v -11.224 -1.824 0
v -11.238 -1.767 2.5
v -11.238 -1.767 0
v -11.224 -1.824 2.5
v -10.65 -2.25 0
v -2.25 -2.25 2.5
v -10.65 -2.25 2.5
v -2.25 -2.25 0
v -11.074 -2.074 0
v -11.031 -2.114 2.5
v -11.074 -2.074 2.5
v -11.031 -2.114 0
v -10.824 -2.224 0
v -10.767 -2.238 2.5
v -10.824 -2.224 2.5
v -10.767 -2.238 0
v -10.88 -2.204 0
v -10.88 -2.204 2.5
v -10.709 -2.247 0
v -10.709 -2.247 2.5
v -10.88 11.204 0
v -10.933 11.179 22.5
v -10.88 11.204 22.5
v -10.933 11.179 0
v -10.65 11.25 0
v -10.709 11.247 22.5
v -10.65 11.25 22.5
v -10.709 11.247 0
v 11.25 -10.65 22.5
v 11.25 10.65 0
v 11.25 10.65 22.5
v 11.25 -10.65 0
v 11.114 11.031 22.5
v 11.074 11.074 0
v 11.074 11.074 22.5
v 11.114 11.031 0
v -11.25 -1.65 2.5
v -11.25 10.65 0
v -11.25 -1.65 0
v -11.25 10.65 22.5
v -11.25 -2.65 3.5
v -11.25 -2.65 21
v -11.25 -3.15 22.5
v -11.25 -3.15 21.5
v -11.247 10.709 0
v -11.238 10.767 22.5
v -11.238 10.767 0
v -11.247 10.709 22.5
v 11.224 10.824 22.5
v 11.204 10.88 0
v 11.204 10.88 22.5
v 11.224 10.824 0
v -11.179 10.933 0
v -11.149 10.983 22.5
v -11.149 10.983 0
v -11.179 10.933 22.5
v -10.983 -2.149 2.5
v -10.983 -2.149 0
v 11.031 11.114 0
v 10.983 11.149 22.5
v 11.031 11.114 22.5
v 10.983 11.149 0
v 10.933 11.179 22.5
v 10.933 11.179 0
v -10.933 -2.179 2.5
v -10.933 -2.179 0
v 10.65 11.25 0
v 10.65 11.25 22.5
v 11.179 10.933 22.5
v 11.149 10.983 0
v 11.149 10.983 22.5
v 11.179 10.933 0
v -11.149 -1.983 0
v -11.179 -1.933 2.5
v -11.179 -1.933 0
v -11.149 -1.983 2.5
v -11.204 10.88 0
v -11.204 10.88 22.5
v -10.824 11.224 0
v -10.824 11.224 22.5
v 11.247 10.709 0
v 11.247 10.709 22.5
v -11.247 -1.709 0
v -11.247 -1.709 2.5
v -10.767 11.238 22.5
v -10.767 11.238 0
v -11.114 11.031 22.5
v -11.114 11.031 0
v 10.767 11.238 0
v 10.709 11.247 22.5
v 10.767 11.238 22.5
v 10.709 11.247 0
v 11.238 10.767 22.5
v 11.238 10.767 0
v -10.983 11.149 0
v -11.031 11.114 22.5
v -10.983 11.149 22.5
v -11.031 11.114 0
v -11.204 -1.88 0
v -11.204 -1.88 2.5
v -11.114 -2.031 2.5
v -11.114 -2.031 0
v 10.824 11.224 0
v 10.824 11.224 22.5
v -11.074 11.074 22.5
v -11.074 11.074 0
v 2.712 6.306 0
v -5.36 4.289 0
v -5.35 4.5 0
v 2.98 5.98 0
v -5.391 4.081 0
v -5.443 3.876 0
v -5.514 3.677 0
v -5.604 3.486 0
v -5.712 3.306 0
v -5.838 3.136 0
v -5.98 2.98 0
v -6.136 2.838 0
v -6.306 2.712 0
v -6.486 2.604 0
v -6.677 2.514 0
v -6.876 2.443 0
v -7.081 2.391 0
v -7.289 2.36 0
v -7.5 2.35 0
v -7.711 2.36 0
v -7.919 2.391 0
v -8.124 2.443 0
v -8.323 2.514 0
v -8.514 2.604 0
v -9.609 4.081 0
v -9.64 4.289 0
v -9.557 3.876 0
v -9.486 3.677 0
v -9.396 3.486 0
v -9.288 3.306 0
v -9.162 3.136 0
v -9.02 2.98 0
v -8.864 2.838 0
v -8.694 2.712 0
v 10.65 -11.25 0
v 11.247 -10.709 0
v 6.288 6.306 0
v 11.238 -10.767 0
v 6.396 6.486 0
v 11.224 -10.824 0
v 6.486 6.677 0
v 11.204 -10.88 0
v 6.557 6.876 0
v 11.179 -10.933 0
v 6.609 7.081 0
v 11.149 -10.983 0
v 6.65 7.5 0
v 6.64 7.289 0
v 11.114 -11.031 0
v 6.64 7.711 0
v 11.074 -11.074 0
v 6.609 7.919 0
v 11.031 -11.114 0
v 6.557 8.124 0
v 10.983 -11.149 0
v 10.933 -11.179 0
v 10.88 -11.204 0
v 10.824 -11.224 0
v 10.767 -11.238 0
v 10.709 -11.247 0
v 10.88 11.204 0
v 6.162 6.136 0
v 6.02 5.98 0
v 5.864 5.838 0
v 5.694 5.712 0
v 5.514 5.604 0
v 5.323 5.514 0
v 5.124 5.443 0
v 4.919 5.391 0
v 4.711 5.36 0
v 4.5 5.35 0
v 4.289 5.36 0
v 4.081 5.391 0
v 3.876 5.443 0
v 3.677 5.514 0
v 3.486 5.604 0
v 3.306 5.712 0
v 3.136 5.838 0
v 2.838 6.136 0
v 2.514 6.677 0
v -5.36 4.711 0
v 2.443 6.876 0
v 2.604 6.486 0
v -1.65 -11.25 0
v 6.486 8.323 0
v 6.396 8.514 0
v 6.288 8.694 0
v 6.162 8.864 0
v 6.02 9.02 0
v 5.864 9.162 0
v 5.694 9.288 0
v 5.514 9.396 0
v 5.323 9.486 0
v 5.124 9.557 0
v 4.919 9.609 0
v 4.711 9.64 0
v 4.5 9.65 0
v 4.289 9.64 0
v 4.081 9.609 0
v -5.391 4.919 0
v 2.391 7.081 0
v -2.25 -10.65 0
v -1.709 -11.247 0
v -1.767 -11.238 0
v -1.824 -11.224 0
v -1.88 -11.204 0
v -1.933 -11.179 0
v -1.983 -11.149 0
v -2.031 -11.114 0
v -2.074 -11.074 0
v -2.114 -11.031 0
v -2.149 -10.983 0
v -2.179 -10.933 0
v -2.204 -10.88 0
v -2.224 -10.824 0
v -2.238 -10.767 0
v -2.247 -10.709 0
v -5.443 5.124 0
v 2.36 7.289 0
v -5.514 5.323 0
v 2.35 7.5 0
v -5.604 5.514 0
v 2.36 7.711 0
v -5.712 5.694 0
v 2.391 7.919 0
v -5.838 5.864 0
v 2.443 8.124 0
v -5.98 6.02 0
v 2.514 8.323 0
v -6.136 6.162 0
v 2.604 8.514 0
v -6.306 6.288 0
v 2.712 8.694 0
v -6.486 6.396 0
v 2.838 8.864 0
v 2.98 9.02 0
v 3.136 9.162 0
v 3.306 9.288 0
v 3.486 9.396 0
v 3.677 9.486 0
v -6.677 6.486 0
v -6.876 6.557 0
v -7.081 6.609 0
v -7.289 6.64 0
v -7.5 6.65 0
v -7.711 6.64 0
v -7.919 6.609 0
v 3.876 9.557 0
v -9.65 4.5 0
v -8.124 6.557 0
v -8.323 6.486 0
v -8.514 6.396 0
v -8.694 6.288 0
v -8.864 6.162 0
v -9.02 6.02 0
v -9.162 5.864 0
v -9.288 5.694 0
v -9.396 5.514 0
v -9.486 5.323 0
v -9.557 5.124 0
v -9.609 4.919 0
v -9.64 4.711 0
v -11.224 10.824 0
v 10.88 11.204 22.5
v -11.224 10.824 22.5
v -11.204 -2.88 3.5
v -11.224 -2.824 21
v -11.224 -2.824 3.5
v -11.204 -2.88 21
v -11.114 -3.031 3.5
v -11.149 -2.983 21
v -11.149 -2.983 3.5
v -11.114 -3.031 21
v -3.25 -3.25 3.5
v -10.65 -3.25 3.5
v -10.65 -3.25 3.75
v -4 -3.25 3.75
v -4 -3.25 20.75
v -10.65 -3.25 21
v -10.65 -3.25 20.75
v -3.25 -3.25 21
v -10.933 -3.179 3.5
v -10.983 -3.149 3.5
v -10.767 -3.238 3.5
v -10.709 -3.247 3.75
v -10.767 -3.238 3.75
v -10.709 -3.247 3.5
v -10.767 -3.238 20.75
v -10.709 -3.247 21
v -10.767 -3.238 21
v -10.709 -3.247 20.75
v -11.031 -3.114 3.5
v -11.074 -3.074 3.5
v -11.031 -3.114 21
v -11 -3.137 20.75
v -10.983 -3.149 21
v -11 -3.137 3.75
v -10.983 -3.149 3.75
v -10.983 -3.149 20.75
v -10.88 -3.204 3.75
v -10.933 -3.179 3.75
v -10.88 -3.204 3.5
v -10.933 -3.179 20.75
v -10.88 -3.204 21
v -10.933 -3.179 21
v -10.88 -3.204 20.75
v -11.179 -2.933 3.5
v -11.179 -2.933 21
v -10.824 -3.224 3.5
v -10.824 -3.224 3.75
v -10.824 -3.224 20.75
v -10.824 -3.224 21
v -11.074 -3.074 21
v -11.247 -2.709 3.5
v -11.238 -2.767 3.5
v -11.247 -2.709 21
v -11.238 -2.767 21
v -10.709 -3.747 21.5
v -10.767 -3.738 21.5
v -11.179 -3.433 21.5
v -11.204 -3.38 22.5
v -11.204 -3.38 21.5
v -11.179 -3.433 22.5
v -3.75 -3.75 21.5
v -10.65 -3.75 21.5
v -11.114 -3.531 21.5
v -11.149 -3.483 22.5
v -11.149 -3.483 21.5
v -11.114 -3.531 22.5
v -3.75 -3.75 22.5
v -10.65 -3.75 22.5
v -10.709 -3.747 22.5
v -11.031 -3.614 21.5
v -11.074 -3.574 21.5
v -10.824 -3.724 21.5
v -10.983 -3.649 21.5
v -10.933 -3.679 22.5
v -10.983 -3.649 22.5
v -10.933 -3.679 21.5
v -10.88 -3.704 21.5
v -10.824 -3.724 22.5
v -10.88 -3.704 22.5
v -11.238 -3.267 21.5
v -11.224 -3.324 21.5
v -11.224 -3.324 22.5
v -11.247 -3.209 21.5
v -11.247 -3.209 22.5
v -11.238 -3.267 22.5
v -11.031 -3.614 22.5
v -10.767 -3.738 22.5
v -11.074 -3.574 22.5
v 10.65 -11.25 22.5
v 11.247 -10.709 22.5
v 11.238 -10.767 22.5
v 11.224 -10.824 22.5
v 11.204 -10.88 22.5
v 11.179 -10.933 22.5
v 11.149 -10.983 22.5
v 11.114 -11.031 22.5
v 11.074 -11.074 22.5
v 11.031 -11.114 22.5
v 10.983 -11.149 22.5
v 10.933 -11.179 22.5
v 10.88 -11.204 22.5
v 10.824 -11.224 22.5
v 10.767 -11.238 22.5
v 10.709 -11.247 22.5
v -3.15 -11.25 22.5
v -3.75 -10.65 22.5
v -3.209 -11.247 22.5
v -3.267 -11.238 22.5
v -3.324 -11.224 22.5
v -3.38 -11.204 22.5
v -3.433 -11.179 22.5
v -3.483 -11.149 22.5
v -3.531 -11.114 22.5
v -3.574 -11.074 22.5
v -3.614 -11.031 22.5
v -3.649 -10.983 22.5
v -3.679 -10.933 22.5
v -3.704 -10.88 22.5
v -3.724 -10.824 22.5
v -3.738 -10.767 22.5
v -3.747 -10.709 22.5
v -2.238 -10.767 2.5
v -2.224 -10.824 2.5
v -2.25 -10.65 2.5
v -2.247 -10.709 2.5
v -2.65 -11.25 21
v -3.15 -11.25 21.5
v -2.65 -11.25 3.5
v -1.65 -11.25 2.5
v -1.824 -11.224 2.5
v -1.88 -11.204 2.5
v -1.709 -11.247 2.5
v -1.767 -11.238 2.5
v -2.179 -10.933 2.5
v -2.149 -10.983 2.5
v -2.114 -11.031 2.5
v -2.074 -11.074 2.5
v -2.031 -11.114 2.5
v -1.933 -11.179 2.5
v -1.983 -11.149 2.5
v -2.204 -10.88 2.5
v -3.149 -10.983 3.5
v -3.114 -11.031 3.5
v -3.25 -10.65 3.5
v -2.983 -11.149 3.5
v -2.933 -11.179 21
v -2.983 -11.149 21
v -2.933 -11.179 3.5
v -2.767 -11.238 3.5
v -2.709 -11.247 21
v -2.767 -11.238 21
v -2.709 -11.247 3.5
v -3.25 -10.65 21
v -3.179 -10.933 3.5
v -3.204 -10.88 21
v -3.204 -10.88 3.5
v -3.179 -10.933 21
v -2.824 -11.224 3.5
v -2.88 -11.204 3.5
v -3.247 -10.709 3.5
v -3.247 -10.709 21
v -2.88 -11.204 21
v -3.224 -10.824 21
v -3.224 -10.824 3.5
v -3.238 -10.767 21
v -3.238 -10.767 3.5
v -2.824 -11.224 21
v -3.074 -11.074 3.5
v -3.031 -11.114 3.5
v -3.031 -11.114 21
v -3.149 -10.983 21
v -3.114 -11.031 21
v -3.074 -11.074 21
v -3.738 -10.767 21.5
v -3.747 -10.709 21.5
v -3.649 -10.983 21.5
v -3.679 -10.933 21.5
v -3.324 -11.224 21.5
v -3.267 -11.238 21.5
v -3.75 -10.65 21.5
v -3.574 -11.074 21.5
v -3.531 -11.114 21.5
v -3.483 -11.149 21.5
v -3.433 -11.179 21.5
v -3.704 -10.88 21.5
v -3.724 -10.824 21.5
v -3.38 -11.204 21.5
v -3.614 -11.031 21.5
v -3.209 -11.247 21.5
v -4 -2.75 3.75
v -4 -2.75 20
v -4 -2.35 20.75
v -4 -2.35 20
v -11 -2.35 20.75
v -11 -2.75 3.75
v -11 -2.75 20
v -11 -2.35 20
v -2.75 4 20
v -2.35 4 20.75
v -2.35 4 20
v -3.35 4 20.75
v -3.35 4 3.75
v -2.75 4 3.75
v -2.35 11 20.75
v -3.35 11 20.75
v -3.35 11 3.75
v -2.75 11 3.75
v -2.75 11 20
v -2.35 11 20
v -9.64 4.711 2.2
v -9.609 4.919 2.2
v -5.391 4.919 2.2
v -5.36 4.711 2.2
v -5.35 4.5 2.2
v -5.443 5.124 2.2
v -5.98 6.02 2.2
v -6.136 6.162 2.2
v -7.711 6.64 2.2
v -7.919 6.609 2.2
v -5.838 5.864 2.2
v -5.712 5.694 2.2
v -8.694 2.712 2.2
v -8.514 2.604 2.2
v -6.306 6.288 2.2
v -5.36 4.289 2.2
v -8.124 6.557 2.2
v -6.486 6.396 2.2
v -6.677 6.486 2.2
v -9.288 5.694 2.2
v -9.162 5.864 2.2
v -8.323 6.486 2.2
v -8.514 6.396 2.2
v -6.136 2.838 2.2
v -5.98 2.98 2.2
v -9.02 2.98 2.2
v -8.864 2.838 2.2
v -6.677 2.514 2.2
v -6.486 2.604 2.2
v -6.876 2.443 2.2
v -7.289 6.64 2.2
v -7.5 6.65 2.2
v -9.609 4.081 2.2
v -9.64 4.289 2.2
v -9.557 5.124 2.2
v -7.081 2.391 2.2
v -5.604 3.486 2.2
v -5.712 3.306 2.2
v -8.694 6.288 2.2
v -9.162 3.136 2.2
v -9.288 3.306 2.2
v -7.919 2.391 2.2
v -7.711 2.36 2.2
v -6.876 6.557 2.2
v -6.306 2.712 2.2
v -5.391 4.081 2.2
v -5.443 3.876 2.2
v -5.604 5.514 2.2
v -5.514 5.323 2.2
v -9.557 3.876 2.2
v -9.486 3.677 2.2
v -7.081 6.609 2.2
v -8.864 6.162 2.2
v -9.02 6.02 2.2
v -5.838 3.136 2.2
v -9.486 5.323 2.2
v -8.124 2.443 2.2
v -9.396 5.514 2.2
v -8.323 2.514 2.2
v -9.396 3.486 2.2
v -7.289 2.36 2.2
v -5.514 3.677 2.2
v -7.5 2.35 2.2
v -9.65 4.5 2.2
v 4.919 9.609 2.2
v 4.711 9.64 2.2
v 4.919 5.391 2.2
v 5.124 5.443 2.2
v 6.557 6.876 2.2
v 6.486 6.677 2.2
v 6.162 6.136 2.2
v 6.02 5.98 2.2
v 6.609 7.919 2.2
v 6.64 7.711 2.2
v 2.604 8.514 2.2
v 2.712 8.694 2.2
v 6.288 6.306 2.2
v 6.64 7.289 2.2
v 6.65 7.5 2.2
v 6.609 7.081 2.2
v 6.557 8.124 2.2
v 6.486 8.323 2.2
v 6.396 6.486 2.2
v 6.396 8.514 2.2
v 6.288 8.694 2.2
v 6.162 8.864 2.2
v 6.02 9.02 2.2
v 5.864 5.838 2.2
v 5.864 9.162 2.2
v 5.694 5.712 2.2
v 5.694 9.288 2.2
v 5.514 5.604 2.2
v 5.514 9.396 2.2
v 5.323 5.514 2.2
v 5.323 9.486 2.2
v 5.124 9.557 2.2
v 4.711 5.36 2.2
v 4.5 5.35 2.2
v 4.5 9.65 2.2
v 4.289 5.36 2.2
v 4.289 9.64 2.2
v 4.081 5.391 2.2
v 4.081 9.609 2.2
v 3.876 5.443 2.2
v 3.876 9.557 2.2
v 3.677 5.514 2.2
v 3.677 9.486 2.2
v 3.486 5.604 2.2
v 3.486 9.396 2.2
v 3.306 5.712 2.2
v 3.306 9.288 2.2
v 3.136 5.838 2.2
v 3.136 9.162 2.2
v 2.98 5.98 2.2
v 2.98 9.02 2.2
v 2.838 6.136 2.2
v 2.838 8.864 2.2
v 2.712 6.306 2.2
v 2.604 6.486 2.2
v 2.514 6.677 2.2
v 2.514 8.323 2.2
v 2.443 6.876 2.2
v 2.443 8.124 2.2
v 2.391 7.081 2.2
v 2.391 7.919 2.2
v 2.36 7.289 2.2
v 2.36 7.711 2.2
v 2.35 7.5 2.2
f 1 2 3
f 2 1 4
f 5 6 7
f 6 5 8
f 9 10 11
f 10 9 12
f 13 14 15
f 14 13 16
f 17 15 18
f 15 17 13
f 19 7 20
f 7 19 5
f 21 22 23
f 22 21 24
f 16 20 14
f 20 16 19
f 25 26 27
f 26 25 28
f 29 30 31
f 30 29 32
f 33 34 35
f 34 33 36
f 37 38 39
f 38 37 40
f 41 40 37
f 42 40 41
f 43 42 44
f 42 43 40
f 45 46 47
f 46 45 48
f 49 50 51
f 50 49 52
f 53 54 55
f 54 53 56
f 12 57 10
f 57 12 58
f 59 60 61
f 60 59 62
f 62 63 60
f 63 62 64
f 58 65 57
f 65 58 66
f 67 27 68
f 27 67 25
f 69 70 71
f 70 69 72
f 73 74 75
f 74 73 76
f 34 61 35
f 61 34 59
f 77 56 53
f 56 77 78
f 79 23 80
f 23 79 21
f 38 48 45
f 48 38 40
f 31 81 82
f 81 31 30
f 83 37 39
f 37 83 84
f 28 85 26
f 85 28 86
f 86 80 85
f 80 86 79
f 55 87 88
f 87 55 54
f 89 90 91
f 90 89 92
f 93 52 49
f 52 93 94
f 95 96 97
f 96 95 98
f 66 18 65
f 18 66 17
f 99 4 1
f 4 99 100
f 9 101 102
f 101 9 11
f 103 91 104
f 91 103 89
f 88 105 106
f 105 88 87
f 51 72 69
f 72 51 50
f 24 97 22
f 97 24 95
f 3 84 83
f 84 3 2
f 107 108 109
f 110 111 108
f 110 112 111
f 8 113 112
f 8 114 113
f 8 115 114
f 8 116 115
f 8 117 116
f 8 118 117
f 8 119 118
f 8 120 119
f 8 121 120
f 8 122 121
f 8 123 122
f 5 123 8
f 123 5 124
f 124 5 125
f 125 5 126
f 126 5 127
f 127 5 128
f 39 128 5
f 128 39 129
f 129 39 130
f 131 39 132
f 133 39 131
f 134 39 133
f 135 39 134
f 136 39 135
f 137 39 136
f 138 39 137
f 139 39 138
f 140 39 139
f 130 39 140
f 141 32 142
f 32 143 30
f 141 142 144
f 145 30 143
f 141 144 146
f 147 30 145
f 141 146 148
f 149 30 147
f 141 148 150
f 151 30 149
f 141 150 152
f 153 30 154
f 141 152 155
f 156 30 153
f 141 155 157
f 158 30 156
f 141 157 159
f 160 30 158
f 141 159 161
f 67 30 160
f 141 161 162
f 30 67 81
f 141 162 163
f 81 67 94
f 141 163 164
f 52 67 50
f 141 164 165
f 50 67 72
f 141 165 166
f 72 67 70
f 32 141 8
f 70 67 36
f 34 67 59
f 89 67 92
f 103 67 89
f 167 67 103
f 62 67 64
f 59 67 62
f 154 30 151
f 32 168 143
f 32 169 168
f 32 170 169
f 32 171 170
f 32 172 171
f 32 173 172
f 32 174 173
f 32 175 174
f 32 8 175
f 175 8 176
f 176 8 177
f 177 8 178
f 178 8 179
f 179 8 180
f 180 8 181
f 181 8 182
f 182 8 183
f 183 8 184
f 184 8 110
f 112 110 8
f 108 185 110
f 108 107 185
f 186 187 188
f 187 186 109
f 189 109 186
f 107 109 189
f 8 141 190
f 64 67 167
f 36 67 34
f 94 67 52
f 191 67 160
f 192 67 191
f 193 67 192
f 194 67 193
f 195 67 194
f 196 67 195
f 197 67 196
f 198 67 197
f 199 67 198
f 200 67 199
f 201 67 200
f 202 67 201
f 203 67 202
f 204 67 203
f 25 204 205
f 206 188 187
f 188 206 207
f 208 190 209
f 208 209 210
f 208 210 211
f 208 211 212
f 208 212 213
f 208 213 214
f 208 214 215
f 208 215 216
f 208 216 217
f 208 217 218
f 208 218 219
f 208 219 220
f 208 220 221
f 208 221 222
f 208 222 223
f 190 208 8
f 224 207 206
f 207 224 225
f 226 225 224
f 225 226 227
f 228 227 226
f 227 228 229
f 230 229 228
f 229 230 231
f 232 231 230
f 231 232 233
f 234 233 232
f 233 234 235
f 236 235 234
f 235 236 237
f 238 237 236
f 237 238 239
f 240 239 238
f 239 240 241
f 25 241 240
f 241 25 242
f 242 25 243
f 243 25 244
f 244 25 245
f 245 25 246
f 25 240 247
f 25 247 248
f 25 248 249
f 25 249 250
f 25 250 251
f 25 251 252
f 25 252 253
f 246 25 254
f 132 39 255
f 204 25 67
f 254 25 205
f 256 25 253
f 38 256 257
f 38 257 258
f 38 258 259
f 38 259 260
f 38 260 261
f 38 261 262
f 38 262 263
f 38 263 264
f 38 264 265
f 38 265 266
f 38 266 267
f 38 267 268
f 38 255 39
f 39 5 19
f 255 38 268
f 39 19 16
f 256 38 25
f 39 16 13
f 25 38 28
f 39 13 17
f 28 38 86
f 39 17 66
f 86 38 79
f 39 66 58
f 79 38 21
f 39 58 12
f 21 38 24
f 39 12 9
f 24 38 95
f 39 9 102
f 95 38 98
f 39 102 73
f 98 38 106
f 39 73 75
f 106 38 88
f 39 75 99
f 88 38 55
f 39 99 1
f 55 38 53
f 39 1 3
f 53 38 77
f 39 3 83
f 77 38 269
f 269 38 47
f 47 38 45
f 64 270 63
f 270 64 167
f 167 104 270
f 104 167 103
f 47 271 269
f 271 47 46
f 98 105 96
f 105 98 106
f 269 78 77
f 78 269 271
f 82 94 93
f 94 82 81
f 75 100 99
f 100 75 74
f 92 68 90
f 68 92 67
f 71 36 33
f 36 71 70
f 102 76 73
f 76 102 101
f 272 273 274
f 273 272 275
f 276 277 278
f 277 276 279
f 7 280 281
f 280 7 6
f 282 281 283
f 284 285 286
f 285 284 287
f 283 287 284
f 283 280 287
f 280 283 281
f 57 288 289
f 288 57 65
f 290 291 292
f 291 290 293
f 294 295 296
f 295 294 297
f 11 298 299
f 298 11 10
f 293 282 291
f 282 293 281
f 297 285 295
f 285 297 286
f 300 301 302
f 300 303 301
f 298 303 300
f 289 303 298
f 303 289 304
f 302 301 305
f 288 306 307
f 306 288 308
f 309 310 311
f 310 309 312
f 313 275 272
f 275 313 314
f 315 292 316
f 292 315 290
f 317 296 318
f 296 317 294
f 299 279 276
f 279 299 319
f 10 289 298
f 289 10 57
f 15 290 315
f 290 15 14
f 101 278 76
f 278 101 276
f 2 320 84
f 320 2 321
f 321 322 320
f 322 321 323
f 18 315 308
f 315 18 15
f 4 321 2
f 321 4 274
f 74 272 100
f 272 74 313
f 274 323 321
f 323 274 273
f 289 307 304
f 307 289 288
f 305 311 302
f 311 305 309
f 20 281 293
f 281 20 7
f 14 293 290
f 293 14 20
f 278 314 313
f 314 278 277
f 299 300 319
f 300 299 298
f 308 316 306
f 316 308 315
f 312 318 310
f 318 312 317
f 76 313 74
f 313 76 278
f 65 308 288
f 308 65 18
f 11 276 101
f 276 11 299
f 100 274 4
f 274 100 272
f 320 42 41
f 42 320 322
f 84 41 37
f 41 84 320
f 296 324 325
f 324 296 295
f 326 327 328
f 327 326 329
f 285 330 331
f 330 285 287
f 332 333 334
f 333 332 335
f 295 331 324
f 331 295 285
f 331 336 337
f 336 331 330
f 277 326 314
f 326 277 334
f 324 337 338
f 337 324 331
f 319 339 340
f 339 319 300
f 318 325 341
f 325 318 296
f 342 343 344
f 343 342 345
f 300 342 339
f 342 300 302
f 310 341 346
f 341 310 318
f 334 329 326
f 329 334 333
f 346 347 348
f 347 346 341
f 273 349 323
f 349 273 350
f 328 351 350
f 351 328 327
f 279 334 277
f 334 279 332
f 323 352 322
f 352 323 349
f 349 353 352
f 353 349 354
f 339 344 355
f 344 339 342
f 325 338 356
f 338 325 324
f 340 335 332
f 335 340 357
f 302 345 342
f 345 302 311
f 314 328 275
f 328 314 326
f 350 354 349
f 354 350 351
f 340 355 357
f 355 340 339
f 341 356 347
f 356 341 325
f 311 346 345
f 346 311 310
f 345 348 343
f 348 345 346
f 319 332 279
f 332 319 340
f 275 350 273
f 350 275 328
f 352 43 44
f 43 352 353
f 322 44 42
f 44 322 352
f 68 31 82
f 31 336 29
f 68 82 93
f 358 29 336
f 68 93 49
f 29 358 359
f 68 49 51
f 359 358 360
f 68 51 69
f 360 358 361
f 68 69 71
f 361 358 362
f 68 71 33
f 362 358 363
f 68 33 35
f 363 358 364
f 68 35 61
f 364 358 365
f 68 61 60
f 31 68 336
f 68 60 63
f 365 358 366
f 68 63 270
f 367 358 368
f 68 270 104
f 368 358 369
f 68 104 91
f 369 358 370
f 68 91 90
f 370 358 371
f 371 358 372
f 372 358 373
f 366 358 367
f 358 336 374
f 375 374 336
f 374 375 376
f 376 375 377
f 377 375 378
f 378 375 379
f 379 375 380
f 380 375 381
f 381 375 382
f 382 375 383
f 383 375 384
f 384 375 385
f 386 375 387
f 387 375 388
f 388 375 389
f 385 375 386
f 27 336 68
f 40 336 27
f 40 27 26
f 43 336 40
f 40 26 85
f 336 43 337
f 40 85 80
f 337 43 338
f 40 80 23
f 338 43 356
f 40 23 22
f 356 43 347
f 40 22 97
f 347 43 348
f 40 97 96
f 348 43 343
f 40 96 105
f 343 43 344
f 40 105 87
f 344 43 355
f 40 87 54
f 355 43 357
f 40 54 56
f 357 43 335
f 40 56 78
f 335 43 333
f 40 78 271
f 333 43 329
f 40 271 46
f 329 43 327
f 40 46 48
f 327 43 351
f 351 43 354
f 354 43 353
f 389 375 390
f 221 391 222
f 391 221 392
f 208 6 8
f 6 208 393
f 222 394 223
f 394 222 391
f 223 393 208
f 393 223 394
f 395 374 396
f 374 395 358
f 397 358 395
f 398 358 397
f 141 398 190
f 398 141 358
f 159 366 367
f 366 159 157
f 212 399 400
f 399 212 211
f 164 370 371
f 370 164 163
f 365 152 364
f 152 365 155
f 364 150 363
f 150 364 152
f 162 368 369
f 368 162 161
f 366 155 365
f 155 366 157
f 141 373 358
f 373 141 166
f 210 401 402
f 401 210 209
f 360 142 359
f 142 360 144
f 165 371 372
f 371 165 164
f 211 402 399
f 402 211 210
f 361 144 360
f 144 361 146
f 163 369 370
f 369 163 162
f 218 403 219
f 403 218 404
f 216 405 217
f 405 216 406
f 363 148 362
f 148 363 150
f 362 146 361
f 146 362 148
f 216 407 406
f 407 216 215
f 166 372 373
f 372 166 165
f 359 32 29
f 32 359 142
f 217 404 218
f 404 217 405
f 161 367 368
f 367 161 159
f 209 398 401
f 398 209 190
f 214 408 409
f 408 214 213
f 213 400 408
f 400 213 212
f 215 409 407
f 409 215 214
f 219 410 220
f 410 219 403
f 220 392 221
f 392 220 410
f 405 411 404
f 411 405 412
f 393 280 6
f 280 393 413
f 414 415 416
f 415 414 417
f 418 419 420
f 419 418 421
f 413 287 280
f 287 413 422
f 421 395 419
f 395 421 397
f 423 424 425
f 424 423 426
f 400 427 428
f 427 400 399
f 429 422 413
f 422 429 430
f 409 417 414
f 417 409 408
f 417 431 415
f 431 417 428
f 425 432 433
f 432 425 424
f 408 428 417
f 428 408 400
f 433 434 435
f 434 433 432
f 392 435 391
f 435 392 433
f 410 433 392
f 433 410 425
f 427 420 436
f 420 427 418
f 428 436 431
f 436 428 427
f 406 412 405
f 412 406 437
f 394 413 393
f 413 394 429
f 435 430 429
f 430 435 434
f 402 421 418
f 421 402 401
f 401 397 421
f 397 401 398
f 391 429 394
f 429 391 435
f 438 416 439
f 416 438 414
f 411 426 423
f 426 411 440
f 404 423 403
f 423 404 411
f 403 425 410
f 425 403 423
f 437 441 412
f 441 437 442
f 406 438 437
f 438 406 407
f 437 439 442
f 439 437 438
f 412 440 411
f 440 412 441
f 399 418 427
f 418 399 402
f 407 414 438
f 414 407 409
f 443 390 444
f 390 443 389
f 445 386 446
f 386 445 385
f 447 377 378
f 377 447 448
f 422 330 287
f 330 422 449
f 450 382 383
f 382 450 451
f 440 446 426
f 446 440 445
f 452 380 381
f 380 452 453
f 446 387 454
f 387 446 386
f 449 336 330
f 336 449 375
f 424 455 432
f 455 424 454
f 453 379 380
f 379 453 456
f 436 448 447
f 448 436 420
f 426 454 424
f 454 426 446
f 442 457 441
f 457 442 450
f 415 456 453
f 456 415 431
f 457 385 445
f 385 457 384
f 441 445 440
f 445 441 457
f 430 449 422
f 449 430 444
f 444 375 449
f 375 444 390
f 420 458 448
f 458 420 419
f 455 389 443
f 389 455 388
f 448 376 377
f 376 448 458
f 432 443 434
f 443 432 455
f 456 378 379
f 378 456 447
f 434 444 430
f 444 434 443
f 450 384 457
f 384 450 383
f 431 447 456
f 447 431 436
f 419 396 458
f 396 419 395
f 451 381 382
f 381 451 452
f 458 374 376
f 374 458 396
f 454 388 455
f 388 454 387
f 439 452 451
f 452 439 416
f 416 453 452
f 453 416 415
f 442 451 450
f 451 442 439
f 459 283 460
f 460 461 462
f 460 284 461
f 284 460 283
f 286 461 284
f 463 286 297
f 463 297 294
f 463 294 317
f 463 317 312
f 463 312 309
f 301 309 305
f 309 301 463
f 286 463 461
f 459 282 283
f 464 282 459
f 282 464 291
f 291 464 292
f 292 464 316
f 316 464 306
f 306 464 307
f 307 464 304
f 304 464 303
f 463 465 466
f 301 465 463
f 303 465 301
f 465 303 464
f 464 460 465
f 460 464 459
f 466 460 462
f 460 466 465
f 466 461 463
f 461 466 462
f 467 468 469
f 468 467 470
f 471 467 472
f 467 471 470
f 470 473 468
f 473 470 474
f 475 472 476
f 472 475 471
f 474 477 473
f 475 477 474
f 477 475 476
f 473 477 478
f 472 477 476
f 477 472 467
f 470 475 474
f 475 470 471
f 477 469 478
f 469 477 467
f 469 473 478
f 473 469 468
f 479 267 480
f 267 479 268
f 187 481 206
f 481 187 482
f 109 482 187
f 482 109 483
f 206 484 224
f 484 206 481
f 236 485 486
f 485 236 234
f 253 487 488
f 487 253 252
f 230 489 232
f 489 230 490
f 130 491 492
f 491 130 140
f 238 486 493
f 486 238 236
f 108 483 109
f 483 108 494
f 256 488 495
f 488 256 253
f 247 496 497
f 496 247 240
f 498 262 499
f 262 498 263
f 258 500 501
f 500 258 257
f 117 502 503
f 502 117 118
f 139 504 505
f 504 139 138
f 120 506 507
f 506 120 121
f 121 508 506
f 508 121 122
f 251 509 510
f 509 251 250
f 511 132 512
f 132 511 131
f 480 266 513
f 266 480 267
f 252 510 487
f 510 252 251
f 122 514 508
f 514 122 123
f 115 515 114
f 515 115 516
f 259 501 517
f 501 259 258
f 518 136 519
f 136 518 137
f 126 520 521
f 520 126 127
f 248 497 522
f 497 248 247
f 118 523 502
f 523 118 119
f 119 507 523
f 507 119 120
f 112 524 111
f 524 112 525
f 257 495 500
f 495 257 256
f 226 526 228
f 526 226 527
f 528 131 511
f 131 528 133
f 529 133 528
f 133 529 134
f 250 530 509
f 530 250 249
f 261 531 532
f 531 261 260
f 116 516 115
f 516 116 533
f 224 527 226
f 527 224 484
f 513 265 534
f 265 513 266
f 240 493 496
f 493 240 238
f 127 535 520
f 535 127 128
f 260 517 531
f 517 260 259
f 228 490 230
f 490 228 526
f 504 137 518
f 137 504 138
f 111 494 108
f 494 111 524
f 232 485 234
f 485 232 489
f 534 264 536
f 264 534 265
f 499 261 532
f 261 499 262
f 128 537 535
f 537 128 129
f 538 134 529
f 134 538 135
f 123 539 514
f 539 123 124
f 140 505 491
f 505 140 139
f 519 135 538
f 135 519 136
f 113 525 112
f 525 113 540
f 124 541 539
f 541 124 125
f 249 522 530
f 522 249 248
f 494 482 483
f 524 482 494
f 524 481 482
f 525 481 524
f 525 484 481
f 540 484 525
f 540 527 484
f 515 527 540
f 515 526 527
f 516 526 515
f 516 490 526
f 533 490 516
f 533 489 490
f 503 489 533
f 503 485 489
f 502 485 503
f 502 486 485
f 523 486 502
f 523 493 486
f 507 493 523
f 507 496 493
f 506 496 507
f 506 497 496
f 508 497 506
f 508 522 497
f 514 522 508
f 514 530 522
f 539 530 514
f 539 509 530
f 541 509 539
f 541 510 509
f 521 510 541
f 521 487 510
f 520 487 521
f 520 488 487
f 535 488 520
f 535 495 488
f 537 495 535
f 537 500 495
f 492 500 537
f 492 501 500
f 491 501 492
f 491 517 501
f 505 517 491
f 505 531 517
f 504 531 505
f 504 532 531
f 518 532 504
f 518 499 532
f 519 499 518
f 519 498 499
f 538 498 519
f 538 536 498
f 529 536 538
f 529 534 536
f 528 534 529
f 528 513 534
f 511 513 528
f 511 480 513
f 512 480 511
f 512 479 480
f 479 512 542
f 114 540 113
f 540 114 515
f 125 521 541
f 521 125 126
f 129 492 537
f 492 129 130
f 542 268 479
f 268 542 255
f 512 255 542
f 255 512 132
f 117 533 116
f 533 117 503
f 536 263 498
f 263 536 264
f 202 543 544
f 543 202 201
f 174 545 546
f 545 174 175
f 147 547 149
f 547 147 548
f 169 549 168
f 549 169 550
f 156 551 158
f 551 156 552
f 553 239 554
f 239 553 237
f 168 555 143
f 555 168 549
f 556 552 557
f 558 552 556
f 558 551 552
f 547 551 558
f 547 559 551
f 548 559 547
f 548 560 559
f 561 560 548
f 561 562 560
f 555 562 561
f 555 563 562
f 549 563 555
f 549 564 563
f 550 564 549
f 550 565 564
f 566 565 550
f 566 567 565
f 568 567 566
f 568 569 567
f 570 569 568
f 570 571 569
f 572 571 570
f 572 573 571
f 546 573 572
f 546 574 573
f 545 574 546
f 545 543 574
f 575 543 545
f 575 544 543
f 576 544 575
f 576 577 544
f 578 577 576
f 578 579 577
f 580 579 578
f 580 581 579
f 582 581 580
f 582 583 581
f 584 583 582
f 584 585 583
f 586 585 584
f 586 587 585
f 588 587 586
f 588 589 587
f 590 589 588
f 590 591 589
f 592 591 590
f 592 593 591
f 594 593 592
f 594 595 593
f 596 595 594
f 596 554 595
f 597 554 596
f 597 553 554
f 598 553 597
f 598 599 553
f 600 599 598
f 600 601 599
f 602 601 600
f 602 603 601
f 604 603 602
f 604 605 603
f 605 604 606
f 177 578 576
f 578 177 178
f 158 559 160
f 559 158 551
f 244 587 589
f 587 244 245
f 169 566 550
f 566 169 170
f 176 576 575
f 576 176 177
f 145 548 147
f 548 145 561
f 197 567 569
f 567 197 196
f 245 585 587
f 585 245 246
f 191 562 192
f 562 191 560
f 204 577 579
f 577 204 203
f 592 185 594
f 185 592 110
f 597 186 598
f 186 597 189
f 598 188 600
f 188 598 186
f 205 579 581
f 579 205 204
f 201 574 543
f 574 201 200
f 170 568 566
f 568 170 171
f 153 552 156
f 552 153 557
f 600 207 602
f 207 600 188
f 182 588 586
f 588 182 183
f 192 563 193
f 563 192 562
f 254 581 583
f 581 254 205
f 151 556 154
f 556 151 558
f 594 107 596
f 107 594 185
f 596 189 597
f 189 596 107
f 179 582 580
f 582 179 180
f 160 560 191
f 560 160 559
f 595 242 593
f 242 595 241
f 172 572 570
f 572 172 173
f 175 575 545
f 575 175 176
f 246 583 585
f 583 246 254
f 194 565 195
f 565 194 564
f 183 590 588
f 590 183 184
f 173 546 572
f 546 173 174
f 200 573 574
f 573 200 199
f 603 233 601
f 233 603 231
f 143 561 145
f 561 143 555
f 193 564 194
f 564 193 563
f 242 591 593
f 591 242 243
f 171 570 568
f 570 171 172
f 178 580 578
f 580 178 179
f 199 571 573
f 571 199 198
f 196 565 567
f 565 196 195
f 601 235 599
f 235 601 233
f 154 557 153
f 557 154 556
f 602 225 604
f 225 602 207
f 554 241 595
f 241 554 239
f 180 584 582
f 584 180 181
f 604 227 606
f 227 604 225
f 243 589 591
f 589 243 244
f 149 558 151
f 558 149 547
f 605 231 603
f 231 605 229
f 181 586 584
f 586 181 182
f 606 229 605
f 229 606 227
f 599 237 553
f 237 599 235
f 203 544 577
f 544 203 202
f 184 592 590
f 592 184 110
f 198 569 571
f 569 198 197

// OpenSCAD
// kitchen / corner_unit — the base unit that turns a corner: two arms of worktop run
// meeting at right angles, so an L or a U kitchen can actually be laid out. Without it a
// run can only ever go in a straight line, which is the one thing a real fitted kitchen
// never does.
//
// It is two base_unit() bodies unioned at right angles — one along X with its back at +Y,
// one along Y with its back at +X — and that union is what makes the piece work. base_unit()
// steps only its own front, so the two together come out with the worktop overhanging and
// the plinth set back on BOTH faces that look into the room, while the two open ENDS stay
// flush for the next length of run to butt against. Neither the slab nor the toe kick has a
// seam across it where the arms meet.
//
// In plan, with the walls at +X and +Y (the front of each arm is the face that looks into
// the room, so this piece has two of them):
//
//     +Y  ┌──────────────────┐        Width  — the length of the arm along X
//         │                  │        Depth  — the length of the arm along Y
//         │   ┌──────────────┤        Arm    — how deep each arm is, both the same
//         │   │              │
//         │   │   the notch  │  +X    the notch is (Width - Arm) x (Depth - Arm):
//         └───┤   is open    │        the open floor in the corner of the room
//             │   floor      │
//             └──────────────┘
//
// Each arm carries ONE DOOR on its exposed leg, not the drawer pairs of worktop.scad: a
// corner unit is a carousel behind a single door, and that door is what tells the corner
// from a length of run meeting it. The leg is the part of an arm that is not buried in the
// corner — 30 cm of it on the standard 90x90 unit, which is exactly one door.
//
// Width/Depth are the real-world lengths of the two arms in cm and Arm their depth: the
// standard corner base unit is 90x90 with 60 cm arms (a 120x120 corner leaves a 60x60 notch
// and takes a wider door on each arm). Height is the real worktop height — the same 90 cm
// counter as the rest of the kitchen — shrunk by the plan scale like the footprint (see
// printed_h() in lib/common.scad), so the corner comes out level with the run either side.
//
// It prints the right way up like every other unit: every step outwards on the way up is one
// of base_unit()'s 45 deg flares, and the magnet pockets open at the plinth, in the floor.

include <../lib/common.scad>

Width  = 90;  // cm — the arm along X
Depth  = 90;  // cm — the arm along Y
Arm    = 60;  // cm — how deep each arm is: the standard base-cabinet depth
Height = 90;  // cm — standard worktop height

// the printed height, mm: Height at the plan scale
Print_h = printed_h(Height);

// The worktop slab, real cm — the same slab as the run it turns (see worktop.scad), so the
// lip line carries round the corner without a step.
Slab = Unit_top;

Show_doors = true;

// Magnet pockets in the bottom face (0 = none). An L has three places to put one — the
// plinth under each arm's exposed leg, and the solid square of plinth in the corner where
// the two arms overlap — so the count picks a layout rather than a row:
//   1  the corner square, the broadest piece of bottom face and the nearest to the
//      centre of gravity;
//   2  one under each arm's leg, corner to opposite corner, which is what stops an L
//      pivoting on the board — the default;
//   3  all three.
// A leg is only (Width - Arm) cm long, so on a plan much smaller than 1:40 it stops being
// able to hold a disc at all; pockets() falls back to the corner square and says so.
Magnets = 2;

corner_unit();

// Arm depth, clamped so a leg is always left for a door and a pocket: an Arm as deep as the
// piece is long would leave no notch, and the "corner" would be a plain square block.
function arm_d() = min(Arm, min(Width, Depth) * 3 / 4);
// The exposed leg of each arm — the part that is not buried in the corner, in real cm.
function leg_a() = Width - arm_d();
function leg_b() = Depth - arm_d();

module corner_unit() {
    if (arm_d() < Arm)
        echo(str("WARNING: a ", Arm, " cm arm leaves no leg on a ", Width, "x", Depth,
                 " cm corner — cut back to ", arm_d(), " cm (give it longer arms: ",
                 "Width/Depth)"));
    difference() {
        union() {
            place_a() base_unit(Width, arm_d(), Print_h, Slab);
            place_b() base_unit(Depth, arm_d(), Print_h, Slab);
        }
        if (Show_doors) {
            place_a() arm_door(Width, leg_a());
            place_b() arm_door(Depth, leg_b());
        }
        if (Magnets > 0) pockets();
    }
}

// The two arms' frames. Everything an arm carries goes inside one of these, so a body, its
// door and its pocket can never drift apart: arm A lies along X with its back at +Y, arm B
// is the same unit turned a quarter turn so its own front points at -X.
module place_a() {
    translate([0, cm(Depth / 2 - arm_d() / 2), 0]) children();
}
module place_b() {
    translate([cm(Width / 2 - arm_d() / 2), 0, 0]) rotate([0, 0, -90]) children();
}

// One arm's door, in that arm's own frame: a single front on the exposed leg, at the end
// away from the corner. unit_fronts() centres its grid, so the whole call is moved onto the
// leg — and it is handed the arm's real face depth, because the grid it is filling
// (<leg_cm> wide) is narrower than the body the cut has to land on (<len_cm>).
module arm_door(len_cm, leg_cm) {
    a = arm_d();
    translate([cm(-len_cm / 2 + leg_cm / 2), 0, 0])
        unit_fronts(leg_cm, a,
                    unit_face_z0(len_cm, a, Print_h, Slab),
                    unit_face_z1(len_cm, a, Print_h, Slab),
                    1, 1, Slab, face_cm = unit_face_d(len_cm, a, Slab));
}

// Which of the three sites get a pocket (see Magnets above), and the fallback for a plan
// too small for a leg to hold one.
module pockets() {
    n  = min(Magnets, 3);
    ok = magnet_count(leg_a(), unit_plinth_d(Width, arm_d()), 1) > 0
      && magnet_count(leg_b(), unit_plinth_d(Depth, arm_d()), 1) > 0;
    if (Magnets > 3)
        echo(str("NOTE: a corner unit has three pocket sites — one under each arm and one ",
                 "in the corner; ", Magnets, " asked for, 3 cut"));
    if (!ok) {
        echo(str("NOTE: a ", leg_a(), " x ", leg_b(), " cm pair of arm legs at 1:", Scale,
                 " is too small to hold a pocket — ", n,
                 " asked for, one cut in the corner square instead"));
        corner_pocket();
    } else if (n == 1) {
        corner_pocket();
    } else {
        place_a() arm_pocket(Width, leg_a());
        place_b() arm_pocket(Depth, leg_b());
        if (n >= 3) corner_pocket();
    }
}

// A pocket under one arm's leg, in that arm's own frame. The footprint handed to magnets()
// is the plinth's and not the carcass's — the plinth is what touches the board — which is
// also why it is shifted back half the toe kick, to sit in the middle of it.
module arm_pocket(len_cm, leg_cm) {
    a = arm_d();
    translate([cm(-len_cm / 2 + leg_cm / 2), cm(unit_back(len_cm, a)) / 2, 0])
        magnets(leg_cm, unit_plinth_d(len_cm, a), 1);
}

// A pocket in the corner square: where the two arms' plinths overlap, in the +X+Y corner
// against the walls, which is the broadest solid piece of the bottom face.
module corner_pocket() {
    a  = arm_d();
    ba = unit_back(Width, a);   // the toe kick eaten off arm A's plinth ...
    bb = unit_back(Depth, a);   // ... and off arm B's
    translate([cm(Width / 2 - (a - bb) / 2), cm(Depth / 2 - (a - ba) / 2), 0])
        magnets(a - bb, a - ba, 1);
}
